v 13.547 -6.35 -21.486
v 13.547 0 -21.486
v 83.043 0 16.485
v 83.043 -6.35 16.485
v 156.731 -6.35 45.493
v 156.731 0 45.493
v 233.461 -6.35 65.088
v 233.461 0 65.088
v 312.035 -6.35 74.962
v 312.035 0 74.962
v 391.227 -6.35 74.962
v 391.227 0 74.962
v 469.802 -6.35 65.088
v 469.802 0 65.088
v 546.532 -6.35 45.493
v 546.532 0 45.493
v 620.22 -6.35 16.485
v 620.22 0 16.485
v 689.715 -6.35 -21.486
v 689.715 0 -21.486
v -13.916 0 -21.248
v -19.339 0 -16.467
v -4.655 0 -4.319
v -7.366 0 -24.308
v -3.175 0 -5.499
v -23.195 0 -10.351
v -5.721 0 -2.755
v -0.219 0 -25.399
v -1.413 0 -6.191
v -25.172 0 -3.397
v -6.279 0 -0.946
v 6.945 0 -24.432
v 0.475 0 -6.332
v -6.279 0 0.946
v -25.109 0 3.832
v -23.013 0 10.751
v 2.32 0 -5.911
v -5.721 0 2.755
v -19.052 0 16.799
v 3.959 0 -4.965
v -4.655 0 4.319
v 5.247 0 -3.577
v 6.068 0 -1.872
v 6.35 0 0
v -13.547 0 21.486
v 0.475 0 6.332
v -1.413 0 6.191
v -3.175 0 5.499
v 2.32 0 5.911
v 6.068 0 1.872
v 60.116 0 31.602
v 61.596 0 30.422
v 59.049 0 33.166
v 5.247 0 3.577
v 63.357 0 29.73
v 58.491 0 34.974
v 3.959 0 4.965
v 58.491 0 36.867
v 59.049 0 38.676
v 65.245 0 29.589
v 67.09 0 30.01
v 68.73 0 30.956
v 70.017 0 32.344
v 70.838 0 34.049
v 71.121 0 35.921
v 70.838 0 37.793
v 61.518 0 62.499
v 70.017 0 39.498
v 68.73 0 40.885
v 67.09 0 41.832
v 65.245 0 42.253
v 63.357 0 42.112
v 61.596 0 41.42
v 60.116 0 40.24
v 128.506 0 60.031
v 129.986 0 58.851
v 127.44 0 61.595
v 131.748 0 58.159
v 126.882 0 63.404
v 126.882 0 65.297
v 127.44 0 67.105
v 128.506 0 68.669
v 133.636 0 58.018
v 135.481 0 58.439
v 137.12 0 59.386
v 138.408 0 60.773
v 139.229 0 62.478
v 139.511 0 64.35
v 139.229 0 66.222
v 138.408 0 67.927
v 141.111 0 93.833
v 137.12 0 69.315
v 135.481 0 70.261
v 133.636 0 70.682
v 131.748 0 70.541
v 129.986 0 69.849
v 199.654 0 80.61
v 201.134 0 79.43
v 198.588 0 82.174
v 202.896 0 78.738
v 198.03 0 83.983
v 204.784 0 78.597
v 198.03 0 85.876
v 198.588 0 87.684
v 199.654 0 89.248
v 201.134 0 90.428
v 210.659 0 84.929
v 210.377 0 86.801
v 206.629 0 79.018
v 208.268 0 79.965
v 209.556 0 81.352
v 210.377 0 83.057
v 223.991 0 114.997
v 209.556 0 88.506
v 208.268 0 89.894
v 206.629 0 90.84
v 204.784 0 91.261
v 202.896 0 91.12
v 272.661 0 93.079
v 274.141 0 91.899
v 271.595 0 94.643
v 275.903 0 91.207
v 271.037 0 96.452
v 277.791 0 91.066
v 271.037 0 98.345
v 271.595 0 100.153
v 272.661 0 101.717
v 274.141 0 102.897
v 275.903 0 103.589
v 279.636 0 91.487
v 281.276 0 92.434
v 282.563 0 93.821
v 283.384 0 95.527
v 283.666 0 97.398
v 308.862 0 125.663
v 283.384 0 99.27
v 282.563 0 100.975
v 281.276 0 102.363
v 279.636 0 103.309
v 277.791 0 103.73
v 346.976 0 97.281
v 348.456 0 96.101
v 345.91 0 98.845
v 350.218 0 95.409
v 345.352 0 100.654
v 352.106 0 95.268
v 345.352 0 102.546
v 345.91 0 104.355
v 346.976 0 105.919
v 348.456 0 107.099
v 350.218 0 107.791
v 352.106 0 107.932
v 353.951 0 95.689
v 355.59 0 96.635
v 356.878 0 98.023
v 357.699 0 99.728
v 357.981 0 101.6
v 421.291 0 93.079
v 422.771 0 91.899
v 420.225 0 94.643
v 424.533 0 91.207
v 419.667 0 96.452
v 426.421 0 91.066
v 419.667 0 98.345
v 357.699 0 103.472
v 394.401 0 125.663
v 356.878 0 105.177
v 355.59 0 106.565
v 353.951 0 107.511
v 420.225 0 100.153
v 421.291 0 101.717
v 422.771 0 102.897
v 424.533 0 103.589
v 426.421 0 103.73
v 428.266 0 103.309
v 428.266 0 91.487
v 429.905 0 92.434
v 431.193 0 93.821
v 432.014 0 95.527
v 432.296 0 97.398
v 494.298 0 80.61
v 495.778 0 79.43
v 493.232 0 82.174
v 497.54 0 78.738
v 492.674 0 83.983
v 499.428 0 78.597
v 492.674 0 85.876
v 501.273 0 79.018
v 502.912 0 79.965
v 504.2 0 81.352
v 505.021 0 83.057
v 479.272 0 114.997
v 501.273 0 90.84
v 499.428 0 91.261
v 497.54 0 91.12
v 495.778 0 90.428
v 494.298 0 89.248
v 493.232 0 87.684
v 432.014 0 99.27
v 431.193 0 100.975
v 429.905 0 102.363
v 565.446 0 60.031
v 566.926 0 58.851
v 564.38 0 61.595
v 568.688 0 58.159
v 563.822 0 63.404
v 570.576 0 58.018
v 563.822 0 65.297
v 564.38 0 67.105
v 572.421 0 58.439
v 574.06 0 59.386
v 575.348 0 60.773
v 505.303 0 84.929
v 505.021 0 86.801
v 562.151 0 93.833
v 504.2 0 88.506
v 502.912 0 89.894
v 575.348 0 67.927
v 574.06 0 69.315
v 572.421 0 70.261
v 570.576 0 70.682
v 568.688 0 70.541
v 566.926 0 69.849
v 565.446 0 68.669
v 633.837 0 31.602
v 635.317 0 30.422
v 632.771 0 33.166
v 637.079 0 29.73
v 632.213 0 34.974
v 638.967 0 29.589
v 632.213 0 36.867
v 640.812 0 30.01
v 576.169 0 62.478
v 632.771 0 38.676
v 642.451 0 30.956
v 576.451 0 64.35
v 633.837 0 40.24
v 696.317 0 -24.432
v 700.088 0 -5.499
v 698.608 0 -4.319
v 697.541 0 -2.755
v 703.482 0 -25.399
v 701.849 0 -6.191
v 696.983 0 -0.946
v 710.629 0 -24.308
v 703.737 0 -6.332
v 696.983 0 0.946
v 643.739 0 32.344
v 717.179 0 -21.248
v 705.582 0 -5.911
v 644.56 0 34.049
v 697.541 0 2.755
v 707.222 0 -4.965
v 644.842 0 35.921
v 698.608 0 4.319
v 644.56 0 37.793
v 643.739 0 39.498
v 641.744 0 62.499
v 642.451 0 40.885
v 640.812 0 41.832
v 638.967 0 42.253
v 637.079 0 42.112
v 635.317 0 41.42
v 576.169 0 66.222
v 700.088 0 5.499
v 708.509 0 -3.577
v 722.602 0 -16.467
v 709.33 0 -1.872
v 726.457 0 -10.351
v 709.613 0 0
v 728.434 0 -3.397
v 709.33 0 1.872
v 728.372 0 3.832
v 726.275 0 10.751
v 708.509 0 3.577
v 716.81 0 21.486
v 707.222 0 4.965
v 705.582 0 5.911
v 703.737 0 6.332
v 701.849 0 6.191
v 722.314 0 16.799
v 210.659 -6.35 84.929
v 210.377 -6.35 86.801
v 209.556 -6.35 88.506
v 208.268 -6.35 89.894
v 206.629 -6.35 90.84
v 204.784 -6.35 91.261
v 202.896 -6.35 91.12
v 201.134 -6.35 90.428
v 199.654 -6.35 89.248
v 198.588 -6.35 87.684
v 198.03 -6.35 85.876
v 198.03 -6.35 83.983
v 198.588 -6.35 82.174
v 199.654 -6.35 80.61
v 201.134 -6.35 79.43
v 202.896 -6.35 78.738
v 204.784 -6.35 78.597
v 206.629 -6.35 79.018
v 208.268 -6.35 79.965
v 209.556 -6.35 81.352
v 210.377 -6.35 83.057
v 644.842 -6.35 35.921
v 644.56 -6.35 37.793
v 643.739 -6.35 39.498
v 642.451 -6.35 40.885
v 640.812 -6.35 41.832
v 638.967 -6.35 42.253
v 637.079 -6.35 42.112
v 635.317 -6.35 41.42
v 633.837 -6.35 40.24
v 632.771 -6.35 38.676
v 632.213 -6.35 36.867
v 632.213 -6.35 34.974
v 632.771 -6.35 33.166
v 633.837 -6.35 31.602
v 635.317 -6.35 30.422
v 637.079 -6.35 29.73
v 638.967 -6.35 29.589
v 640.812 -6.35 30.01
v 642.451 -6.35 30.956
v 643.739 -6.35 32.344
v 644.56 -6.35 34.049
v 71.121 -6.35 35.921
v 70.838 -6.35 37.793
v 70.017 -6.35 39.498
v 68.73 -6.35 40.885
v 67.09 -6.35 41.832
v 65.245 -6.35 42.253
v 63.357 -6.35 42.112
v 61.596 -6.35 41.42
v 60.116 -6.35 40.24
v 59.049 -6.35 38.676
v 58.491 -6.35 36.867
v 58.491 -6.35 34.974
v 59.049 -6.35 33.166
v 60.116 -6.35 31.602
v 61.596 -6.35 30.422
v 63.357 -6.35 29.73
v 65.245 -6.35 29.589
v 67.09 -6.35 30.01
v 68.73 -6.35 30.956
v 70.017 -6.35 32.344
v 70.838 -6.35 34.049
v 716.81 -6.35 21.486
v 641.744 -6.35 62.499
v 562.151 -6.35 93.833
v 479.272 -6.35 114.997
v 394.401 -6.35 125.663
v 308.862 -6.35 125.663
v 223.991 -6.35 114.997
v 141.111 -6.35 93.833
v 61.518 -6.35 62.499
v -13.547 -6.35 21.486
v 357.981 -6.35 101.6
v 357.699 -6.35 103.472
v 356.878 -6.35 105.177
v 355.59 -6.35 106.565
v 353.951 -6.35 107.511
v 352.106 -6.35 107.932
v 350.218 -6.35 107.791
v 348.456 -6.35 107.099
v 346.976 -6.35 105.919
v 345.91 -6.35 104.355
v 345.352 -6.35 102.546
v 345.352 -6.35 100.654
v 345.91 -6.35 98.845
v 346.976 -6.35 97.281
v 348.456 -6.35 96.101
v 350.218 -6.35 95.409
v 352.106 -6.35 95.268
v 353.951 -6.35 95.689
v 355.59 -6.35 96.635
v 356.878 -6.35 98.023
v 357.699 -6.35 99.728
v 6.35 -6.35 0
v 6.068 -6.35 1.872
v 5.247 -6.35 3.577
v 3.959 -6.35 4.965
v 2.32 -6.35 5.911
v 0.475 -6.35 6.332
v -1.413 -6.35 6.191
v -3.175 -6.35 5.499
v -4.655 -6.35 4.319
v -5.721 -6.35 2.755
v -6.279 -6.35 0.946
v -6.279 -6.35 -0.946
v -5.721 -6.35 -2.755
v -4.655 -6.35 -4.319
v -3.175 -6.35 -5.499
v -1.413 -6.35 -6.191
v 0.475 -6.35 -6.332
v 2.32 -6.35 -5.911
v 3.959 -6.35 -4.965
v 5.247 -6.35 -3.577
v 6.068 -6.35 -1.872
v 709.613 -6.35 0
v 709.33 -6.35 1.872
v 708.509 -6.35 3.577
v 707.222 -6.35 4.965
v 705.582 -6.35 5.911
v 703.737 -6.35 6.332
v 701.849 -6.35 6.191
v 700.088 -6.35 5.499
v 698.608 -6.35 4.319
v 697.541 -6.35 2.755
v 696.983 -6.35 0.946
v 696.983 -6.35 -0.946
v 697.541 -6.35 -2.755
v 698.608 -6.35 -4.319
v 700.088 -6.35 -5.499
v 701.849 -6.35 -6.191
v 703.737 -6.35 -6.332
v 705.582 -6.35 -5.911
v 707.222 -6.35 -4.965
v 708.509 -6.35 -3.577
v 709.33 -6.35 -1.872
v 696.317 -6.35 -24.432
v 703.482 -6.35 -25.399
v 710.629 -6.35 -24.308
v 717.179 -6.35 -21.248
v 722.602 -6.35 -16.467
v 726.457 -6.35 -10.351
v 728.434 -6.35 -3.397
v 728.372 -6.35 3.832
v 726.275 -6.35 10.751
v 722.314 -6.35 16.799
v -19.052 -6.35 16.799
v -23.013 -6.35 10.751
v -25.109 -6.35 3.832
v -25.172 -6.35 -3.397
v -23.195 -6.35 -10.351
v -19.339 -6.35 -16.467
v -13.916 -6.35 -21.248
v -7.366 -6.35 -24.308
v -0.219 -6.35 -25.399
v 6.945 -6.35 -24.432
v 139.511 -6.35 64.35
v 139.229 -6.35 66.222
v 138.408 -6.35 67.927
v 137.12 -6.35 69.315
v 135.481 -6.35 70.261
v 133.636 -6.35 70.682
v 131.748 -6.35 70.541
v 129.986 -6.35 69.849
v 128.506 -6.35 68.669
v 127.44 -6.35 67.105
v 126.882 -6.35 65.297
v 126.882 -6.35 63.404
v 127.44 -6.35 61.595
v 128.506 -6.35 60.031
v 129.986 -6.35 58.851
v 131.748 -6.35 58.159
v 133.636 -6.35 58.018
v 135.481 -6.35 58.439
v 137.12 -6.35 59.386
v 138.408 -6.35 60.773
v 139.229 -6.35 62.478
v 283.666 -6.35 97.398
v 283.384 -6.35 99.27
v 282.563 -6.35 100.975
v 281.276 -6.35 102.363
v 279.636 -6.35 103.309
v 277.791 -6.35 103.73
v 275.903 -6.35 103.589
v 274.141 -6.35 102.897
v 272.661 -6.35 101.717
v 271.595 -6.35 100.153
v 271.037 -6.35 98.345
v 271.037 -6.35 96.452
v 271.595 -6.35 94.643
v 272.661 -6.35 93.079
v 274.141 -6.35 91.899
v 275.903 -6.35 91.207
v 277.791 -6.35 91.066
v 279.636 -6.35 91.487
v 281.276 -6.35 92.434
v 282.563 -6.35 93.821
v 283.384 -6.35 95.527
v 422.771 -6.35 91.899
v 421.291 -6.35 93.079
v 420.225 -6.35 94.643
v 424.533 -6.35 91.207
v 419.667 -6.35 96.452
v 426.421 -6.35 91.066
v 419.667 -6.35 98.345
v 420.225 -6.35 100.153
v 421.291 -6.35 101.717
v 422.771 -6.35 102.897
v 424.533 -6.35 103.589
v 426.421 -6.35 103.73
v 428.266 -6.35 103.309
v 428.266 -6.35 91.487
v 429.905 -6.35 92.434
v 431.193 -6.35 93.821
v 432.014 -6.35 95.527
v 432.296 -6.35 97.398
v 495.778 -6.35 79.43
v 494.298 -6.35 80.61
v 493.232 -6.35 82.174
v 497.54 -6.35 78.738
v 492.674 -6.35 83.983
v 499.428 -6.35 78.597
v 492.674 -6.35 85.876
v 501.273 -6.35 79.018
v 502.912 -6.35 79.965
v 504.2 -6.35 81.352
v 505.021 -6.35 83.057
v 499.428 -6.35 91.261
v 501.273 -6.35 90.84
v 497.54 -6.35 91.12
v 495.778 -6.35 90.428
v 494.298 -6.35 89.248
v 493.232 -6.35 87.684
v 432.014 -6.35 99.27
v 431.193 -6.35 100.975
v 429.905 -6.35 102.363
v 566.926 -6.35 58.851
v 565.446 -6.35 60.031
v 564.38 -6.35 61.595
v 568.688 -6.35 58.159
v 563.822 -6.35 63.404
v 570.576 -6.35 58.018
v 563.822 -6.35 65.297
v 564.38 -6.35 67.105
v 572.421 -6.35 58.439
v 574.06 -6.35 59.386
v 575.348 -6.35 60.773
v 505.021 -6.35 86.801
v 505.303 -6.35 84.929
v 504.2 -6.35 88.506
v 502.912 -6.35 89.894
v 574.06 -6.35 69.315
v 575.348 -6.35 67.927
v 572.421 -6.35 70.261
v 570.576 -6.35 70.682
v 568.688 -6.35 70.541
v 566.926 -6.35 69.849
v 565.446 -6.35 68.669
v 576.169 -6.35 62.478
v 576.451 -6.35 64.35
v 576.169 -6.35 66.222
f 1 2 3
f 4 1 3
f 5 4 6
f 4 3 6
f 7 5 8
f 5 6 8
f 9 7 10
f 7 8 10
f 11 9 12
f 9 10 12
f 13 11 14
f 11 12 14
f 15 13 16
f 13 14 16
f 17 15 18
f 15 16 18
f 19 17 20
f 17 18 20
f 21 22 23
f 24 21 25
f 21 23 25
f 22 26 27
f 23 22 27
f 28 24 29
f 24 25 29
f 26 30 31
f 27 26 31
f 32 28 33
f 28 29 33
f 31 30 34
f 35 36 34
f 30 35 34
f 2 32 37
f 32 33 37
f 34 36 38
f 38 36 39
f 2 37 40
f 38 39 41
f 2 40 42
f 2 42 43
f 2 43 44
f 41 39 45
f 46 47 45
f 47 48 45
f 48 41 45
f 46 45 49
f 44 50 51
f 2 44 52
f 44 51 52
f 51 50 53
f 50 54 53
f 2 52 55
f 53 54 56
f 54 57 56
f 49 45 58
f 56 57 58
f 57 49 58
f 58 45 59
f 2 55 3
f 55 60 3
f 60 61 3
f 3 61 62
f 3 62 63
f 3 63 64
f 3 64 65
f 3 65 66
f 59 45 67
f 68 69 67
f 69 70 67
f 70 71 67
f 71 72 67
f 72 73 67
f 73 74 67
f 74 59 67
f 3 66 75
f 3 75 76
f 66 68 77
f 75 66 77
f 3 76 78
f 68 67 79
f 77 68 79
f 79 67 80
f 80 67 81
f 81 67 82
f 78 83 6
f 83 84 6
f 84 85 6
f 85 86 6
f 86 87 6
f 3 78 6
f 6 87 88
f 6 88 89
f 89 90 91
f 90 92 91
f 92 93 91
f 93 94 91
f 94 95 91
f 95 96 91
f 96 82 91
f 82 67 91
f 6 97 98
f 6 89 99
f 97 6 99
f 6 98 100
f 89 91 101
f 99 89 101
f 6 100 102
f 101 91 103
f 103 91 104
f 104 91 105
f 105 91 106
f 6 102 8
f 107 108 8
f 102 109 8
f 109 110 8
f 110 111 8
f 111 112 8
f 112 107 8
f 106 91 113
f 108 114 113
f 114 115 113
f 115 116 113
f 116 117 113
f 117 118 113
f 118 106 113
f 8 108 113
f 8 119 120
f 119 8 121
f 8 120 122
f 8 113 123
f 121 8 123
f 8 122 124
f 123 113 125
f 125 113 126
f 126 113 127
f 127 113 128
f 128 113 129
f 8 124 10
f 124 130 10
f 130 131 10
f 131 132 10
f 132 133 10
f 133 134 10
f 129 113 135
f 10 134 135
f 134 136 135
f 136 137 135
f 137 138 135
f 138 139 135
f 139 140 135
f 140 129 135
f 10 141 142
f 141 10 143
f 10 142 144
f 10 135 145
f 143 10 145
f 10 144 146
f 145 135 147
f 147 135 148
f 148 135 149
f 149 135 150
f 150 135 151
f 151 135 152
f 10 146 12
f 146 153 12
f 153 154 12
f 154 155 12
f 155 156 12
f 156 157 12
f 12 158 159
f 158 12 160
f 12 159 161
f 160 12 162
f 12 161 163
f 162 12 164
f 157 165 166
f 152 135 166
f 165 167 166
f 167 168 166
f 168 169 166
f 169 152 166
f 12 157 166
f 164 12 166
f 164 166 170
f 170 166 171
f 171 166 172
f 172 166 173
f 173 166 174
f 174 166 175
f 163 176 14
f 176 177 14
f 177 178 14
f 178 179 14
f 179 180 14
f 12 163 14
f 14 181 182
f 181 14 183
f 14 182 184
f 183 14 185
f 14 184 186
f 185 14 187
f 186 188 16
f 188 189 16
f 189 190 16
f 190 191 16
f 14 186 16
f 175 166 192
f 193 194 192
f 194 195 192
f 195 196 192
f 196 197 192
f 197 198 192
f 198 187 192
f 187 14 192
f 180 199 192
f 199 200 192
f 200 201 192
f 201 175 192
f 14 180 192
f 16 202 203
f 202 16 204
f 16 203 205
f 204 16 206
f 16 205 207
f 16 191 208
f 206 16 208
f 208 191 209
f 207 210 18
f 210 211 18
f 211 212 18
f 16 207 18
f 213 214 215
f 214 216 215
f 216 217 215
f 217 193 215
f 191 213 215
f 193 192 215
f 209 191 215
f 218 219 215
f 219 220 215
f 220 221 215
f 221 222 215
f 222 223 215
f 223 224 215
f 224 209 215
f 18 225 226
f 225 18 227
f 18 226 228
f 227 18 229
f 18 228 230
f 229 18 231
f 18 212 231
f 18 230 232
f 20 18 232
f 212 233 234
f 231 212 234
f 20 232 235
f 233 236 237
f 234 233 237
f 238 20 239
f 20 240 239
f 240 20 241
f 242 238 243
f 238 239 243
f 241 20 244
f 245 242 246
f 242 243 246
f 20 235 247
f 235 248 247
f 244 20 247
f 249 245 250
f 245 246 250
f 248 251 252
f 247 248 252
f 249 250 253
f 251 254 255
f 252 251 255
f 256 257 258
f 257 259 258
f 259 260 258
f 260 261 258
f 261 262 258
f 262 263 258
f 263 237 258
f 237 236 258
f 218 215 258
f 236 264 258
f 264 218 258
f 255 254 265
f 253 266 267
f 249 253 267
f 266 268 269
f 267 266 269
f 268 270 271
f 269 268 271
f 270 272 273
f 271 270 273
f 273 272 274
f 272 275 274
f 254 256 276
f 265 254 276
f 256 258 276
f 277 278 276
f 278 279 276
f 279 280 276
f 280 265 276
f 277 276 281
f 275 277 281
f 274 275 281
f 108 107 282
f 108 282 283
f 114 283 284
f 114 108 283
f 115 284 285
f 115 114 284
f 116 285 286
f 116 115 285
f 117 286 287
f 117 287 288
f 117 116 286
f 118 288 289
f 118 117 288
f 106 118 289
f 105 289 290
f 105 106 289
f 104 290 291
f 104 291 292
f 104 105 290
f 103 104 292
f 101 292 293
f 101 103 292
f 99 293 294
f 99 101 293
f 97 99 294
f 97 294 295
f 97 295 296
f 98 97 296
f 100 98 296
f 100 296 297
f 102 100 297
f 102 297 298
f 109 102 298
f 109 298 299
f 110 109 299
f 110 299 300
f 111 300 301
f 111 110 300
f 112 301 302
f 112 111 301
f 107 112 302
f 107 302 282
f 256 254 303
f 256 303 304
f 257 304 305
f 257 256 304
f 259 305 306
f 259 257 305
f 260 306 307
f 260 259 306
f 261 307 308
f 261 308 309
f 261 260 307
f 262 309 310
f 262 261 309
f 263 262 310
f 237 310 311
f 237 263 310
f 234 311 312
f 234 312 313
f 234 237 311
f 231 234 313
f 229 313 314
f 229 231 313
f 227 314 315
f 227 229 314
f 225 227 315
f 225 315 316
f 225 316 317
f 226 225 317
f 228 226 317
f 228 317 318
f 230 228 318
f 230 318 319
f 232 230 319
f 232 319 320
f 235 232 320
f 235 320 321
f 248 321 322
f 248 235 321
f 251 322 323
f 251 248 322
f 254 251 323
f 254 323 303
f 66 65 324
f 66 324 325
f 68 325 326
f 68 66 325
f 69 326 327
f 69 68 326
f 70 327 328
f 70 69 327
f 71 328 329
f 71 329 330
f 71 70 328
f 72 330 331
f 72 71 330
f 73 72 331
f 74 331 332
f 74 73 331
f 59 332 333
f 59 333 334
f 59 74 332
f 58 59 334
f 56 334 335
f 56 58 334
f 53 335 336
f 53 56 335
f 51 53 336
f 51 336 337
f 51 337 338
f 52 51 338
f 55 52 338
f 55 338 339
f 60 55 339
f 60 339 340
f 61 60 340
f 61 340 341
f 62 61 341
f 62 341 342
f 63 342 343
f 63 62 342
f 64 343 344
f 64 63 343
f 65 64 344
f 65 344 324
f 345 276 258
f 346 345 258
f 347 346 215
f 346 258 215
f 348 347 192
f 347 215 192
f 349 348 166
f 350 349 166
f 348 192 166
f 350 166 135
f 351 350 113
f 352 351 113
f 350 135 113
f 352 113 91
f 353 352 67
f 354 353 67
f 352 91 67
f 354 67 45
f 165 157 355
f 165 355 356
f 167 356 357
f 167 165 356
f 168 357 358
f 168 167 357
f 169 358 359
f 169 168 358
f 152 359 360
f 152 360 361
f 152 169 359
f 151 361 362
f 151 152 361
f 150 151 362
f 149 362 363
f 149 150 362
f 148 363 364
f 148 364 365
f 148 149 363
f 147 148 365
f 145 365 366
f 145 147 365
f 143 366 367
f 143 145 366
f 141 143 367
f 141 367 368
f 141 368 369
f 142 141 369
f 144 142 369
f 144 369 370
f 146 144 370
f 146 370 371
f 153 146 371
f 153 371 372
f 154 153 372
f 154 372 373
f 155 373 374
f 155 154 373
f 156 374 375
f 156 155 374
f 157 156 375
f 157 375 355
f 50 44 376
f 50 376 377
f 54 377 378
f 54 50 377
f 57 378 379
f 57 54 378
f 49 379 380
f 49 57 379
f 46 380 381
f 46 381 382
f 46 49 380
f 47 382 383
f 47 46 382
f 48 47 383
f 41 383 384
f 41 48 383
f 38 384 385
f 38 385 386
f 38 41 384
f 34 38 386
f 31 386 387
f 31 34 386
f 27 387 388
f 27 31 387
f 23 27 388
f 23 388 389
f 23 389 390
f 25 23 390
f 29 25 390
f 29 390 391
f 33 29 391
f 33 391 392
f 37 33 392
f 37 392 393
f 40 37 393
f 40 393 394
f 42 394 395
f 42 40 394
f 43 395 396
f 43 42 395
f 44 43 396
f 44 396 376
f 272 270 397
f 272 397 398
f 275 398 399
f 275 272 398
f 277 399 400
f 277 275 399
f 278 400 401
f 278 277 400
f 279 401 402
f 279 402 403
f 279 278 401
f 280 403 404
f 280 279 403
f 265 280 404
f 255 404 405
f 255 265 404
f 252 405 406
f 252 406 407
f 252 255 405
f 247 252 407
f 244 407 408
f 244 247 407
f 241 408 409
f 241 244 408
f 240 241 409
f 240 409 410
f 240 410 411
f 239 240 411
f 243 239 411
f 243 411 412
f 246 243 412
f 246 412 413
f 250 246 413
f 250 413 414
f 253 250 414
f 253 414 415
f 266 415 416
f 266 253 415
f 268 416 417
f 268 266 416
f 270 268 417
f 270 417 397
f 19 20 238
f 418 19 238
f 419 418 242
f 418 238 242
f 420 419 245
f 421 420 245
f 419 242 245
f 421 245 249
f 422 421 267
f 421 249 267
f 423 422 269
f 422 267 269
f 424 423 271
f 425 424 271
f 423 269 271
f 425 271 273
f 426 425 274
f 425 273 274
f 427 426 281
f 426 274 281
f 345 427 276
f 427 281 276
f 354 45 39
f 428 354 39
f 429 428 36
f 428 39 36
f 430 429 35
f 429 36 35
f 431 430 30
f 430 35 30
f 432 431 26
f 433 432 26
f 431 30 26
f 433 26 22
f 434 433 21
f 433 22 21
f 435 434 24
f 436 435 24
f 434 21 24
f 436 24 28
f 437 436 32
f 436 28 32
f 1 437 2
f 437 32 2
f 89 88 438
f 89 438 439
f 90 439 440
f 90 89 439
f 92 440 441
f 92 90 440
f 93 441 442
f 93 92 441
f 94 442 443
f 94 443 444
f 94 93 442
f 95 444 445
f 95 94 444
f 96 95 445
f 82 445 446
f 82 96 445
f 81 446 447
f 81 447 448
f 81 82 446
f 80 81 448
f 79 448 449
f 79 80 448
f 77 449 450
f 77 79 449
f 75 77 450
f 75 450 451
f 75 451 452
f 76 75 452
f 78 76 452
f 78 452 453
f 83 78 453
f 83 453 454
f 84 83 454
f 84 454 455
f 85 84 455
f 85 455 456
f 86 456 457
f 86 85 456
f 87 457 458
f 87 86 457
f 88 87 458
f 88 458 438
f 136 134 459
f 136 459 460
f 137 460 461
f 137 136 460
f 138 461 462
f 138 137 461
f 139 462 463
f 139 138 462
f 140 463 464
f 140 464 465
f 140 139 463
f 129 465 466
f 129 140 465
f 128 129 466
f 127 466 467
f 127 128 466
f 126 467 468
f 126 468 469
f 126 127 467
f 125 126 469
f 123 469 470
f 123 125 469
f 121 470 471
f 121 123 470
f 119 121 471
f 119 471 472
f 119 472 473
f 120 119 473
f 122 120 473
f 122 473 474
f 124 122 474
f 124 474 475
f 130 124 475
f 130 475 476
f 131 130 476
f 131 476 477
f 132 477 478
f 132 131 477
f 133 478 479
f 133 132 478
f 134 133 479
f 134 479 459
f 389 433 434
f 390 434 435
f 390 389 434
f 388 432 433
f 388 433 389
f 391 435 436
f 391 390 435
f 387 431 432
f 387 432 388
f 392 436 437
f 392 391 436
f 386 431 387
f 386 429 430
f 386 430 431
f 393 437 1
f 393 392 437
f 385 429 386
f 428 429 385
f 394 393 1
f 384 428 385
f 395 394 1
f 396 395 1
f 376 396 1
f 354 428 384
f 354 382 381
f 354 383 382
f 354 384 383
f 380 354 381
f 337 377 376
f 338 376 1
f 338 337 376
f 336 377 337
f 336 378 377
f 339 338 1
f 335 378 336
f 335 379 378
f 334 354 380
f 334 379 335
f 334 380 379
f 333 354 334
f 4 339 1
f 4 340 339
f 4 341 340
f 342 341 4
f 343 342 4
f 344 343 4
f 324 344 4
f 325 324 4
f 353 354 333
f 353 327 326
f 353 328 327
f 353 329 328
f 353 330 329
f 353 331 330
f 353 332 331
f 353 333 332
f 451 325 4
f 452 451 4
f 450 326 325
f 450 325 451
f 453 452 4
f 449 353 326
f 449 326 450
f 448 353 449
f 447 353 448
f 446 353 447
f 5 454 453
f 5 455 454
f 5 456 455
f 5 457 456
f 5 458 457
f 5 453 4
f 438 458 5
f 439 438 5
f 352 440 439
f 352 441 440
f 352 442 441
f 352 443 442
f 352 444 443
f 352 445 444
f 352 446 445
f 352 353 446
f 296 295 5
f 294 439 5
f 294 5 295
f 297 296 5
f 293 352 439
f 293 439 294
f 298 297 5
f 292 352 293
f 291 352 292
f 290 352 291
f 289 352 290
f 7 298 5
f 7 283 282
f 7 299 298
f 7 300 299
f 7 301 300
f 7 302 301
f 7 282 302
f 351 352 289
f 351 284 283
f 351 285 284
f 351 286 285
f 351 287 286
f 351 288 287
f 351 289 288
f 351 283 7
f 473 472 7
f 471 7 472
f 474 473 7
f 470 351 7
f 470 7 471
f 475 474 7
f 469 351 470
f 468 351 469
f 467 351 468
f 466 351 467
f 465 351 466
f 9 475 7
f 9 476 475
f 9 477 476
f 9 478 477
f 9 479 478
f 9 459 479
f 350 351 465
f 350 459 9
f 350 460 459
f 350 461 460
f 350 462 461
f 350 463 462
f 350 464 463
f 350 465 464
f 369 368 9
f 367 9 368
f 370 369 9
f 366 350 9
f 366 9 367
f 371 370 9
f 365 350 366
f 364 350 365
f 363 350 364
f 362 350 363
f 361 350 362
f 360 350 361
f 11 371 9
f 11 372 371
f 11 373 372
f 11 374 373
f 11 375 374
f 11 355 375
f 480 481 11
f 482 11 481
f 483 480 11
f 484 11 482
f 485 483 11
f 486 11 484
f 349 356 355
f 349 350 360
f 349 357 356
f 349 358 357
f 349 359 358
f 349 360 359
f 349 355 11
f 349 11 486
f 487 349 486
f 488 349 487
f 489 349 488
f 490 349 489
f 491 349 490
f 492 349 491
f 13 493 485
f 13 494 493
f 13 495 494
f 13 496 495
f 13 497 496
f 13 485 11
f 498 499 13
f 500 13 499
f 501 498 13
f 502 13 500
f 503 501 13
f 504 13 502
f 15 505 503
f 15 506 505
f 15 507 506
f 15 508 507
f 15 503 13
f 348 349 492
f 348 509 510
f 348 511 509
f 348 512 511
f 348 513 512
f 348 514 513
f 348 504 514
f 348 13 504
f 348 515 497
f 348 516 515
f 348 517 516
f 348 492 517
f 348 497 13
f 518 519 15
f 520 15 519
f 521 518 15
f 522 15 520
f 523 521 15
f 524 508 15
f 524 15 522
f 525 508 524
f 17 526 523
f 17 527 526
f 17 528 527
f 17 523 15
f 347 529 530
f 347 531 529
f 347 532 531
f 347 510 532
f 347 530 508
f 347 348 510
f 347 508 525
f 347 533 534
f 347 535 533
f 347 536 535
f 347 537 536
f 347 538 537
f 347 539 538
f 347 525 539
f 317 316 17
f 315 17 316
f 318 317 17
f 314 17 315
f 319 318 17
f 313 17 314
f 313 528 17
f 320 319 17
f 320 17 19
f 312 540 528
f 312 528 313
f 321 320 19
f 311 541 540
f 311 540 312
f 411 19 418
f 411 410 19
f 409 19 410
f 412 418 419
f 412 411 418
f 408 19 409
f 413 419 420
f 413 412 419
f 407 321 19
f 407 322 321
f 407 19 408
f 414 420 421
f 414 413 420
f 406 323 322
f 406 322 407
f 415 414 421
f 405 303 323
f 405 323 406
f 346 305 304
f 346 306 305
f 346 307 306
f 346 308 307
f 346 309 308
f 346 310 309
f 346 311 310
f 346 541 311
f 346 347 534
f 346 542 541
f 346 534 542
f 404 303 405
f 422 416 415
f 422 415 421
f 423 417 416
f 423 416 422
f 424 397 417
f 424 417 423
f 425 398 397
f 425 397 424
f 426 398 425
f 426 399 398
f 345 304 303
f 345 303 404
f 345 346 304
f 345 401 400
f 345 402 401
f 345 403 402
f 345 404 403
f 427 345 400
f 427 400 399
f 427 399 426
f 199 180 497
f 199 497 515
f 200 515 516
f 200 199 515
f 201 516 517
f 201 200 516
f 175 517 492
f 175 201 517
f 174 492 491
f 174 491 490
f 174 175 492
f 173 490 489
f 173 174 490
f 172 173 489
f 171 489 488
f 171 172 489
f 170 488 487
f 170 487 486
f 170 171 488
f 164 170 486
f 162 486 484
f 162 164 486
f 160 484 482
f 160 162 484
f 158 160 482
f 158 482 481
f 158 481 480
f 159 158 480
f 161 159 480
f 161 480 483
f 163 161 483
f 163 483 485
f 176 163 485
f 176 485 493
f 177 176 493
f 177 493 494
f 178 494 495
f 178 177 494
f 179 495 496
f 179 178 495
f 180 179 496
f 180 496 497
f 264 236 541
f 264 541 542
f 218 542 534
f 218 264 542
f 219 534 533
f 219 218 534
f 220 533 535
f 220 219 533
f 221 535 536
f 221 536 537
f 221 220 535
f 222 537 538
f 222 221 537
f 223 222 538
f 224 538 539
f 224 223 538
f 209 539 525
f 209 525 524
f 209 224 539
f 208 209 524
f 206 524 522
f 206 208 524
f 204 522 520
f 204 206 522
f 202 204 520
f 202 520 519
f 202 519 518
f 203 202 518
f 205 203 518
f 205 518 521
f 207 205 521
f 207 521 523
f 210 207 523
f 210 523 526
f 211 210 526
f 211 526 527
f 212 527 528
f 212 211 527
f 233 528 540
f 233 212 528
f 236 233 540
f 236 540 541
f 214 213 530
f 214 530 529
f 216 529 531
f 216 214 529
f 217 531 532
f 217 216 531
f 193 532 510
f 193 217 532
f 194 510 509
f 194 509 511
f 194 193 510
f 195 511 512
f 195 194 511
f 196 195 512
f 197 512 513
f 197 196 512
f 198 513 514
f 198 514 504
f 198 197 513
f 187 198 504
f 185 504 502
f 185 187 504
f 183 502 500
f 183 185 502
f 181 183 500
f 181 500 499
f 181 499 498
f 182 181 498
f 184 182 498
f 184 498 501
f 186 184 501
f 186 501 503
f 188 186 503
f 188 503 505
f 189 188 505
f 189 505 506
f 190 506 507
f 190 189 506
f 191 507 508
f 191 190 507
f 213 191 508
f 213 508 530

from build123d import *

# Parameters (mm, degrees)
F0_R     = 6.35
F1_DEPTH = 6.35


with BuildPart() as f1:
    # F0 (on Front) → F1 (new body)
    with BuildSketch(Plane.XZ):
        with BuildLine():
            ThreePointArc((689.715387, -21.48571), (724.74821, -13.547113), (716.809613, 21.48571))
            ThreePointArc((716.809613, 21.48571), (351.63125, 127), (-13.547113, 21.48571))
            ThreePointArc((-13.547113, 21.48571), (-21.48571, -13.547113), (13.547113, -21.48571))
            ThreePointArc((13.547113, -21.48571), (351.63125, 76.2), (689.715387, -21.48571))
        make_face()
        Circle(F0_R, mode=Mode.SUBTRACT)
        with Locations((64.770503, 35.920821)):
            Circle(F0_R, mode=Mode.SUBTRACT)
        with Locations((703.2625, 0)):
            Circle(F0_R, mode=Mode.SUBTRACT)
        with Locations((638.491997, 35.920821)):
            Circle(F0_R, mode=Mode.SUBTRACT)
        with Locations((133.16127, 64.350144)):
            Circle(F0_R, mode=Mode.SUBTRACT)
        with Locations((204.309192, 84.929181)):
            Circle(F0_R, mode=Mode.SUBTRACT)
        with Locations((277.316359, 97.398219)):
            Circle(F0_R, mode=Mode.SUBTRACT)
        with Locations((351.63125, 101.6)):
            Circle(F0_R, mode=Mode.SUBTRACT)
        with Locations((498.953308, 84.929181)):
            Circle(F0_R, mode=Mode.SUBTRACT)
        with Locations((570.10123, 64.350144)):
            Circle(F0_R, mode=Mode.SUBTRACT)
        with Locations((425.946141, 97.398219)):
            Circle(F0_R, mode=Mode.SUBTRACT)
    extrude(amount=F1_DEPTH)


solid = f1.part
